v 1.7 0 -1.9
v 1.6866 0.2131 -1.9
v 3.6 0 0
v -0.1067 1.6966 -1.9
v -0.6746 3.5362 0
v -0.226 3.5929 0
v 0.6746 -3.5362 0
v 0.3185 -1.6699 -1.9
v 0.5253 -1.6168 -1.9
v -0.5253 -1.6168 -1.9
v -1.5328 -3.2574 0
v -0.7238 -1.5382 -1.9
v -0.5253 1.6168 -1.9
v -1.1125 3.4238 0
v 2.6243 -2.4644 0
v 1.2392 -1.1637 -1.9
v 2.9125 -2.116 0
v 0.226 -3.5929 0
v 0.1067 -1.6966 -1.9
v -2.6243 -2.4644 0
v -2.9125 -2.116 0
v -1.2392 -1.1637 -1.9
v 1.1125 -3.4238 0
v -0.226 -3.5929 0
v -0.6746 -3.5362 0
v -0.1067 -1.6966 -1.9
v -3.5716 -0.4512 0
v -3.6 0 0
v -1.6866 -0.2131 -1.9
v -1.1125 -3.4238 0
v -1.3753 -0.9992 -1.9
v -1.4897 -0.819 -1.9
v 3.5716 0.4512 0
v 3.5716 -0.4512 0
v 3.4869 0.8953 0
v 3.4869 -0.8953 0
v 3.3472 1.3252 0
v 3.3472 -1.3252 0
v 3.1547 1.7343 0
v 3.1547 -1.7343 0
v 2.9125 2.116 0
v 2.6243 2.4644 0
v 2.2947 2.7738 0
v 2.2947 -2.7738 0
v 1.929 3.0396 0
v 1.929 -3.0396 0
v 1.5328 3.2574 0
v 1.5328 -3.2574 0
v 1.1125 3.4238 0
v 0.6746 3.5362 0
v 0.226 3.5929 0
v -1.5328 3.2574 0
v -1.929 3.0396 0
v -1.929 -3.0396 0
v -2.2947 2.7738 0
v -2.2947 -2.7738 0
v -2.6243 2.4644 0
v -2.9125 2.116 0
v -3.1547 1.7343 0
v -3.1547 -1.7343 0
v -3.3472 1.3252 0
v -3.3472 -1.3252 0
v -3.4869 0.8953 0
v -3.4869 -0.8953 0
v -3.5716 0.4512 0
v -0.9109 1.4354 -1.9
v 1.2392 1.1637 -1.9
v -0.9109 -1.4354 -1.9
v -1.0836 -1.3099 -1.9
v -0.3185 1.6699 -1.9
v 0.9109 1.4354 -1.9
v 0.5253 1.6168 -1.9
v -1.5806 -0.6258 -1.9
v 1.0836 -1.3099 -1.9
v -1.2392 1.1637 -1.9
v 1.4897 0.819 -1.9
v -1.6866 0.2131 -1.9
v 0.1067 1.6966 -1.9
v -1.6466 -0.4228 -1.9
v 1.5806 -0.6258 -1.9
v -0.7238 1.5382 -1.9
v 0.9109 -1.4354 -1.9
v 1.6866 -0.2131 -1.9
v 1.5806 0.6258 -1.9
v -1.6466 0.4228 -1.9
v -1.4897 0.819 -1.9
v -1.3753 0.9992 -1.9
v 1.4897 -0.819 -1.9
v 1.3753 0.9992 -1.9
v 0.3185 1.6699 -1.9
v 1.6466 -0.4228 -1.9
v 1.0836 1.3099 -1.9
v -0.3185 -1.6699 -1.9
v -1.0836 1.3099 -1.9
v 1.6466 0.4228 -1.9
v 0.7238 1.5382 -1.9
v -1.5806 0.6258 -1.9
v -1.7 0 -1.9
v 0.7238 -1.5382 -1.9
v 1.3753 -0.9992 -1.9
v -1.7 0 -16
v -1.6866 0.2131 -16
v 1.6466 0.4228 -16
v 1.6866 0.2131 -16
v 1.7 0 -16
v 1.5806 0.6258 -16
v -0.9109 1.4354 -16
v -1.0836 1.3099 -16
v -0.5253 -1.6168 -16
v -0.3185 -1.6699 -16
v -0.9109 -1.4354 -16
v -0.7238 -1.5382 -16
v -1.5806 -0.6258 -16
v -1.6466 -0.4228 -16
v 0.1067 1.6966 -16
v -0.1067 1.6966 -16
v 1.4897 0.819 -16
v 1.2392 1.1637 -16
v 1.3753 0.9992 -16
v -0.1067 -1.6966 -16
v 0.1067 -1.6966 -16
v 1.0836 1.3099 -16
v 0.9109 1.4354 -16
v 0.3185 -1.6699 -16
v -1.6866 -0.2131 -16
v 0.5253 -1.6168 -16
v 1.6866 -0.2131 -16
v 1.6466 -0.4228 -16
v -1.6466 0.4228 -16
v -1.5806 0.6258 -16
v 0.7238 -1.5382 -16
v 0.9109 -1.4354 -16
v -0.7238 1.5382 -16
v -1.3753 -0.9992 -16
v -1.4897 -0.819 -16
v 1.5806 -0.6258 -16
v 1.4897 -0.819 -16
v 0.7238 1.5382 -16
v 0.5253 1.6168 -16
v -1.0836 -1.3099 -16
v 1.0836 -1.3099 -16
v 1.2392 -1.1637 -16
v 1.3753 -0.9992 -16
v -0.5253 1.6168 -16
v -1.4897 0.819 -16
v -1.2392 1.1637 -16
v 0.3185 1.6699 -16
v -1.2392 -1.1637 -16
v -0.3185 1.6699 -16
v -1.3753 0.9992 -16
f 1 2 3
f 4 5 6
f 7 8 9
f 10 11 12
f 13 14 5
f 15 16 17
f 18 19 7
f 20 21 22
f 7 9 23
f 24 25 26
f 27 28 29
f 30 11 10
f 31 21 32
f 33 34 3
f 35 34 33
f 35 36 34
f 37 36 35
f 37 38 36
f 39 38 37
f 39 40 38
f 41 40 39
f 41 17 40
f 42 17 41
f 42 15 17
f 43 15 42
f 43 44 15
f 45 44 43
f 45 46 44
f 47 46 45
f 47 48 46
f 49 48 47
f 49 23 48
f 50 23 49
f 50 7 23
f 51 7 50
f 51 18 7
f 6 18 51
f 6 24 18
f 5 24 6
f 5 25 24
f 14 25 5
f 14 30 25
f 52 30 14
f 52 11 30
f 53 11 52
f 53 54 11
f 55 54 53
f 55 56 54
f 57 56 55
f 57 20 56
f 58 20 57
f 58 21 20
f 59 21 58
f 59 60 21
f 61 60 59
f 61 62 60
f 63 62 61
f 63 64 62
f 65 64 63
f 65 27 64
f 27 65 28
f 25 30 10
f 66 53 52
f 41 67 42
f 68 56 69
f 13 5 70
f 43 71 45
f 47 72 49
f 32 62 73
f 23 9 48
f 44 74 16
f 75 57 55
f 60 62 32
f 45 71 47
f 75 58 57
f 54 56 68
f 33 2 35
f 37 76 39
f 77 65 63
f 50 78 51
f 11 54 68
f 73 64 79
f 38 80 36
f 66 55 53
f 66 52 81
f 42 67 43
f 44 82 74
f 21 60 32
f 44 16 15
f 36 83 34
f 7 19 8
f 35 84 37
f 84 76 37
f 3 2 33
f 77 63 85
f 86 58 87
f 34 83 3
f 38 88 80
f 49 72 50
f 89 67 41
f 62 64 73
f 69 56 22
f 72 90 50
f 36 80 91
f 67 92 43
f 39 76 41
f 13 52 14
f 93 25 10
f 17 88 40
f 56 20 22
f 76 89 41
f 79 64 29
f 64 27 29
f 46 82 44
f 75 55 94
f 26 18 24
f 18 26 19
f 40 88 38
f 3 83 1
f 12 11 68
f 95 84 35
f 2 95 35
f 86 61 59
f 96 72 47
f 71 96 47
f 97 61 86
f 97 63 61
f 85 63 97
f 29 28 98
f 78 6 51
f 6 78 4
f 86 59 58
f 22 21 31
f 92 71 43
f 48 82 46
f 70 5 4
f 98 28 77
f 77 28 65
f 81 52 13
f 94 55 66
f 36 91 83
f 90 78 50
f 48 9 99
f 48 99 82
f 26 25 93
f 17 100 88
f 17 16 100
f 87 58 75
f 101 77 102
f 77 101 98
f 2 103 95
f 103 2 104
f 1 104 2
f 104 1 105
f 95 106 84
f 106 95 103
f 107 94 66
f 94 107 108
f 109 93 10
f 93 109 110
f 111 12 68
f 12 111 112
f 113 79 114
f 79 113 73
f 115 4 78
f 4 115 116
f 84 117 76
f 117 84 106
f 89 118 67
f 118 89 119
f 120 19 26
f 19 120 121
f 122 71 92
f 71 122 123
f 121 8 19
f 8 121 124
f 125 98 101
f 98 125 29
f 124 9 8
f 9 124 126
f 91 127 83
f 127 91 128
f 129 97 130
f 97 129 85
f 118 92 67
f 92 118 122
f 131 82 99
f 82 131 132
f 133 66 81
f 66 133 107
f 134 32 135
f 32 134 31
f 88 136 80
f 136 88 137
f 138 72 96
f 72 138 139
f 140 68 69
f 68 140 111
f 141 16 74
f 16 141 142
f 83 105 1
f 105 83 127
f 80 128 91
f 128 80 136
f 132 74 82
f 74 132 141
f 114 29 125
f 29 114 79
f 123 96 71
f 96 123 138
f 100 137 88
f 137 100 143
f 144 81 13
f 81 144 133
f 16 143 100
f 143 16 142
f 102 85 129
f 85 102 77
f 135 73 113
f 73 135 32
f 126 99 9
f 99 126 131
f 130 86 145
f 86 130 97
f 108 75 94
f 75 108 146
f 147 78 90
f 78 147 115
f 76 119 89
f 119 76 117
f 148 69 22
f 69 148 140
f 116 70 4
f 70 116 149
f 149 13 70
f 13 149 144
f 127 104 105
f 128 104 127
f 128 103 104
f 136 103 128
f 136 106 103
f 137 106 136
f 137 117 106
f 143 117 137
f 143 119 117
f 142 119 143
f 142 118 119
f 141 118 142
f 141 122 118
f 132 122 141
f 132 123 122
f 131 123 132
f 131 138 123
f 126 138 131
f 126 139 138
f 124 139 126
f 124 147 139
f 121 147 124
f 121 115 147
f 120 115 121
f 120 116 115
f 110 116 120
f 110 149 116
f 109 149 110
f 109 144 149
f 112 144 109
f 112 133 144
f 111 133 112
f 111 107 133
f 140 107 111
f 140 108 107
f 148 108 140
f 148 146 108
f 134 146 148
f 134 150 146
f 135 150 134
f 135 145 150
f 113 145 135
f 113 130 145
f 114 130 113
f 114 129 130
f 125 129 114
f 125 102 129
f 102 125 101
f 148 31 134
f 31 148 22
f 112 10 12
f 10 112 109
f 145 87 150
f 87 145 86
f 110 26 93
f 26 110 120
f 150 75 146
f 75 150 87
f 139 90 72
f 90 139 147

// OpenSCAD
// Generated by SolidPython 1.1.3 on 2023-03-13 21:43:02
$fn = 50;


difference() {
	union() {
		translate(v = [0, 0, -1.9000000000]) {
			rotate(a = [0, 0, 0]) {
				cylinder(h = 1.9000000000, r1 = 1.7000000000, r2 = 3.6000000000);
			}
		}
		translate(v = [0, 0, -16]) {
			rotate(a = [0, 0, 0]) {
				cylinder(h = 16, r = 1.7000000000);
			}
		}
	}
	union();
}
/***********************************************
*********      SolidPython code:      **********
************************************************
 
from solid import *
import os
import subprocess

import oomB

import opsc_library_gen

mode = "laser"
#mode = "3d_print"

defined_objects = {}

radius_dict = {}
countersunk_dict = {}


def set_mode(m):
    global mode
    mode = m
    radius_dict['M6'] = 6.5/2
    radius_dict['M3'] = 3.3/2
    if mode == "laser":
        radius_dict['M6'] = 6/2
        radius_dict['M3'] = 3/2

    countersunk_dict['M3'] = {}
    countersunk_dict['M3']['little_rad'] = radius_dict['M3']
    countersunk_dict['M3']['big_rad'] = (5.5+0.6)/2
    if mode == "laser":
        countersunk_dict['M3']['big_rad'] = (4.75+0.6)/2
        countersunk_dict['M3']['little_rad'] = (4.75+0.6)/2

    countersunk_dict['M3']['height'] = 1.7


def opsc_make_object(filename, objects, save_type="none",resolution=50, layers = 1, tilediff = 200, mode="laser", overwrite=True):
    if overwrite or not os.path.exists(filename):
        set_mode(mode)
        save_type = save_type.lower()
        os.makedirs(os.path.dirname(filename), exist_ok=True)
        final_object = opsc_get_object(objects, mode = mode)
        # Save the final object to the specified filename    
        scad_render_to_file(final_object, filename, file_header='$fn = %s;' % resolution, include_orig_code=True)
        if save_type == "all":
            saveToAll(filename)
        elif save_type == "dxf":
            saveToDxf(filename)
        if mode == "laser":
            filename_laser = filename.replace(".scad","-flat.scad")
            scad_render_to_file(getLaser(final_object, layers=layers, tilediff=tilediff), filename_laser, file_header='$fn = %s;' % resolution, include_orig_code=True)
            if save_type == "all":
                saveToAll(filename_laser)
            elif save_type == "dxf":
                saveToDxf(filename_laser)


def opsc_get_object(objects, mode = "laser"):
    # Create the solidpython objects only include the positive objects and if they don't have inclusion or their inclusion is either all or mode
    # Initialize an empty list to store the results
    positive_objects = []

    # Iterate over the "objects" list
    for obj in objects:
        # Check if the current object has a "type" key with a value of "positive"
        if obj['type'] == 'positive':
            # Check if the current object has an "inclusion" key and its value matches "mode",
            # or if the current object does not have an "inclusion" key at all
            if not 'inclusion' in obj or obj['inclusion'] == "all" or obj['inclusion'] == mode:
                # Call the "get_opsc_item" function with the current object as an argument
                opsc_item = get_opsc_item(obj)
                # Add the result to the "positive_objects" list
                positive_objects.append(opsc_item)
# Initialize an empty list to store the results
    negative_objects = []

    # Iterate over the "objects" list
    for obj in objects:
        # Check if the current object has a "type" key with a value of "negative"
        if obj['type'] == 'negative':
            # Check if the current object has an "inclusion" key and its value matches "mode",
            # or if the current object does not have an "inclusion" key at all
            if not 'inclusion' in obj or obj['inclusion'] == "all" or obj['inclusion'] == mode:
                # Call the "get_opsc_item" function with the current object as an argument
                opsc_item = get_opsc_item(obj)
                # Add the result to the "negative_objects" list
                negative_objects.append(opsc_item)
    
    #positive_objects = [get_opsc_item(obj) for obj in objects if obj['type'] == 'positive']
    #negative_objects = [get_opsc_item(obj) for obj in objects if obj['type'] == 'negative']
    # Union the positive objects
    positive_object = union()(*positive_objects)
    # Union the negative objects
    negative_object = union()(*negative_objects)
    # Create the final object by subtracting the negative objects from the positive objects
    return difference()(positive_object, negative_object)

def get_opsc_item(params):
    # A dictionary to map radius string values to numerical values
    #radius_dict = {'small': 5, 'medium': 10, 'large': 15}
    # An array of function names for basic shapes
    basic_shapes = ['cube', 'sphere', 'cylinder']
    
    # An array of function names for other shapes
    other_shapes = ['hole', 'slot', 'rounded_rectangle', 'countersunk', 'polyg']
    


    # Convert radius to r if present, and remove radius from the params dictionary
    if 'radius' in params:
        if isinstance(params['radius'], str):
            # Use the radius_dict to map the radius string value to a numerical value
            params['r'] = radius_dict[params['radius']]
        else:
            params['r'] = params['radius']
        del params['radius']
    

    # Check if the object type is a basic shape
    if params['shape'] in basic_shapes:
        # Remove shape and unexpected dictionary values
        allowed_keys = {'size', 'r', 'r1', 'r2', 'd', 'h', 'rw', 'rh', 'dw', 'dh'}
        shape_params = {k: v for k, v in params.items() if k in allowed_keys}

        #params['m'] = "#"
        ###split for adding modifier
        try:
            m = params['m']
            func = globals()[params['shape']]
            return_value = get_opsc_transform(params,func(**shape_params))
            return_value = (return_value).set_modifier(m)
            return return_value
        except KeyError as e:
            return get_opsc_transform(params,globals()[params['shape']](**shape_params))
        
    elif params['shape'] == 'polygon':
        # Remove shape and unexpected dictionary values
        h  = params['height']
        allowed_keys = {'points'}
        shape_params = {k: v for k, v in params.items() if k in allowed_keys}

        # Call the corresponding function for the shape parameter, using ** notation to pass the shape_params dictionary as keyword arguments
        params["rot"] = [0,0,0]        
        try:
            m = params['m']
            func = globals()[params['shape']]
            return_value = get_opsc_transform(params,linear_extrude(h)(globals()[params['shape']](**shape_params)))
            return_value = (return_value).set_modifier(m)
            return return_value
        except KeyError as e:
            return_value = get_opsc_transform(params,linear_extrude(h)(globals()[params['shape']](**shape_params)))
            return_value = (return_value)
            return return_value


    # If the object type is not a basic shape, check if it's a defined object or one of the other shapes
    elif params['shape'] in other_shapes:
        # Call the corresponding function for the shape parameter, passing the params dictionary as an argument
        p2 = copy.deepcopy(params)
        p2["pos"] = [0,0,0]
        return get_opsc_transform(params,globals()[params['shape']](p2))
    
    # If the object is not a basic shape or a defined object, try to import it from a .scad file
    else:
        obj = defined_objects[params['shape']]
        return get_opsc_transform(params,obj)

def get_opsc_transform(params, solid_obj):
    # Rotate the object based on the 'rot' field in the params dictionary, or the 'rotX', 'rotY', and 'rotZ' fields if 'rot' is not present
    rot = params.get('rot', [])
    if rot:
        rotX, rotY, rotZ = rot
    else:
        rotX = params.get('rotX', 0)
        rotY = params.get('rotY', 0)
        rotZ = params.get('rotZ', 0)
    solid_obj = rotate([rotX, rotY, rotZ])(solid_obj)

    # Translate the object based on the 'pos' field in the params dictionary, or the 'x', 'y', and 'z' fields if 'pos' is not present
    pos = params.get('pos', [])
    if pos:
        x, y, z = pos
    else:
        x = params.get('x', 0)
        y = params.get('y', 0)
        z = params.get('z', 0)
    solid_obj = translate([x, y, z])(solid_obj)
    return solid_obj


import random

def opsc_easy_array(type, shape, repeats, pos_start, shift_arr, **kwargs):
    for i in range(0,3):
        repeats.append(1)
        pos_start.append(0)
        shift_arr.append(0)
    return_objects = []

    for x in range(0,repeats[0]):
        for y in range(0,repeats[1]):
            for z in range(0,repeats[2]):
                return_objects.append(opsc_easy(type, shape, pos=[pos_start[0]+x*shift_arr[0],pos_start[1]+y*shift_arr[1],pos_start[2]+z*shift_arr[2]], **kwargs))
    return return_objects                



def opsc_easy(type, shape, **kwargs):
    obj = {
        'type': type,
        'shape': shape
    }
    for param in ['size', 'r', 'r1', 'r2', 'd', 'h', 'rw', 'rh', 'dw', 'dh', 'pos', 'x', 'y', 'z', 'rot', 'rotX', 'rotY', 'rotZ', "w", "inclusion", 'sides', 'height', "m"]:
        if param in kwargs:
            obj[param] = kwargs[param]
    return obj

def hole(params):
    p2 = copy.deepcopy(params)  
    # Check if the radius is a string and replace it with the corresponding value from the dictionary
    if isinstance(p2['r'], str):
        p2['r'] = radius_dict[p2['r']]
    
    # Set the height to 100 if not specified
    if 'h' not in p2:
        p2['h'] = 100
        p2["pos"] = [0,0,-50]
    p2["center"] = True
    # Create the cylinder object
    p2["shape"] = "cylinder"
    p2["type"] = "positive"

    return get_opsc_item(p2)

import copy

def countersunk(params):
    p2 = copy.deepcopy(params)
    counter_rad = p2['r']
    p2['r'] = radius_dict[p2['r']]
    hp = copy.deepcopy(p2)
    hp["type"] = "positive"
    hp["shape"] = "hole"
    del hp["rot"]
    hol = get_opsc_item(hp)
    
    cp = copy.deepcopy(p2)
    cp["h"] = countersunk_dict[counter_rad]["height"]
    cp["r2"] = countersunk_dict[counter_rad]["little_rad"]
    cp["r1"] = countersunk_dict[counter_rad]["big_rad"]
    del cp["r"]
    del cp["rot"]
    cp["type"] = "positive"
    cp["shape"] = "cylinder"
    cp["pos"] = [0,0,0]

    top = get_opsc_item(cp)
    return union()(hol,top)



def slot(params):  
    p2 = copy.deepcopy(params) 
    if isinstance(p2['r'], str):
        p2['r'] = radius_dict[p2['r']]
    p2["type"] = "positive"
    p2["shape"] = "hole"
    del p2["rot"]
    p2["pos"] = [0,0,0]
    left = copy.deepcopy(p2)
    right = copy.deepcopy(p2)
    left["pos"][0] = p2["w"] / 2 - p2["r"] 
    
    right["pos"][0] = -p2["w"] / 2 + p2["r"] 
    pass
    leftObj = get_opsc_item(left)
    rightObj = get_opsc_item(right)
    return hull()(leftObj, rightObj)

def rounded_rectangle(params):   
    p2 = copy.deepcopy(params) 
    p2["h"] = p2["size"][2]
    p2["pos"] = p2.get("pos", [0, 0, 0]) 
    p2["type"] = "positive"
    p2["shape"] = "hole"
    p2["pos"] = [0,0,0]
    
    if 'rot' in p2:
        del p2["rot"]   
    if 'r' not in p2:
        p2["r"] = 5 
    tl = copy.deepcopy(p2)
    tr = copy.deepcopy(p2)
    bl = copy.deepcopy(p2)
    br = copy.deepcopy(p2)
    tl["pos"][0] = -(p2["size"][0] - p2["r"]*2)/2
    tl["pos"][1] = (p2["size"][1] - p2["r"]*2)/2
    tr["pos"][0] = (p2["size"][0] - p2["r"]*2)/2
    tr["pos"][1] = (p2["size"][1] - p2["r"]*2)/2
    bl["pos"][0] = -(p2["size"][0] - p2["r"]*2)/2
    bl["pos"][1] = -(p2["size"][1] - p2["r"]*2)/2
    br["pos"][0] = (p2["size"][0] - p2["r"]*2)/2
    br["pos"][1] = -(p2["size"][1] - p2["r"]*2)/2
    del tl["size"]
    del tr["size"]
    del bl["size"]
    del br["size"]
    tlo = get_opsc_item(tl)
    tro = get_opsc_item(tr)
    blo = get_opsc_item(bl)
    bro = get_opsc_item(br)    
    return hull()(tlo, tro, blo, bro)



def polyg(params):
    p2 = copy.deepcopy(params) 
    p2["type"] = "positive"
    p2["shape"] = "polygon"
    p2["pos"] = [0,0,0]
    sides = p2["sides"]
    radius = p2["r"]    
    angles = [i * 360 / sides for i in range(sides)]
    points = regular_polygon(sides, radius)
    
    p2["points"] = points
    return get_opsc_item(p2)

import math

def regular_polygon(num_sides, radius):
    # Calculate the angle between each side
    angle = 2 * math.pi / num_sides

    # Calculate the points of the polygon
    points = []
    for i in range(num_sides):
        x = radius * math.cos(i * angle)
        y = radius * math.sin(i * angle)
        points.append((x, y))
    return points

def import_scad_object(filename):
    # Import the .scad file and convert it to a solidpython object
    #filename = "parts"
    obj = import_scad(filename)
    return obj.main()



import os
import solid as solidpython

# A dictionary to store the defined objects


def load_scad_objects():
    opsc_library_gen.gen_library(defined_objects)

import random

def test(num_objects):
    objects = []
    for i in range(num_objects):
        # Choose a random shape
        #shape = random.choice(['cube', 'sphere', 'cylinder', 'hole', 'slot', "rounded_rectangle"])
        shape = random.choice(["rounded_rectangle"])

        # Choose a random type
        type = random.choice(['positive', 'negative'])
        
        # Create an empty object dictionary
        obj = {'shape': shape, 'type': type}
        
        # Set shape-specific parameters
        if obj['shape'] in ['cube']:
            obj['size'] =  [random.uniform(5, 15), random.uniform(5, 15), random.uniform(5, 15)]
        if obj['shape'] in ['rounded_rectangle']:
            obj['size'] =  [random.uniform(5, 15), random.uniform(5, 15), random.uniform(5, 15)]
            obj['r'] = random.uniform(0.5, 5)
        elif obj['shape'] == 'sphere':
            obj['r'] = random.uniform(5, 15)
        elif obj['shape'] in ['cylinder', 'hole']:
            obj['r'] = random.uniform(0.5, 5)
            obj['h'] = random.uniform(5, 15)
        elif obj['shape'] == 'slot':
            obj['r'] = random.uniform(0.5, 5)
            obj['h'] = random.uniform(5, 15)
            obj['w'] = random.uniform(5, 15)
        
        # Set a random position and rotation
        obj['pos'] = [random.uniform(-20, 20), random.uniform(-20, 20), random.uniform(-20, 20)]
        obj['rot'] = [random.uniform(-180, 180), random.uniform(-180, 180), random.uniform(-180, 180)]
        
        # Add the object to the list
        objects.append(obj)
    return objects

####### old file saving
def saveToAll(fileIn):
    saveToStl(fileIn)
    saveToDxf(fileIn)
    saveToPng(fileIn)
    saveToSvg(fileIn)

def saveToDxf(fileIn, fileOut="", copy_to_laser=True):
    if fileOut == "":
        fileOut = fileIn.replace(".scad",".dxf")
    saveToFile(fileIn, fileOut)


    
def saveToPng(fileIn, fileOut="",extra="--render"):
    if fileOut == "":
        fileOut = fileIn.replace(".scad",".png")
    saveToFile(fileIn, fileOut)

def saveToStl(fileIn, fileOut=""):
    if fileOut == "":
        fileOut = fileIn.replace(".scad",".stl")
    saveToFile(fileIn, fileOut)
    
def saveToSvg(fileIn, fileOut=""):
    if fileOut == "":
        fileOut = fileIn.replace(".scad",".svg")
    saveToFile(fileIn, fileOut)

def saveToFile(fileIn, fileOut,extra=""):
    #extra = extra + " --colorscheme Tomorrow"

    launchStr = 'openscad -o "' + fileOut + '"' + extra + ' "' + fileIn + '"'
    if ".png" in fileOut:
        launchStr = launchStr + " --render"
    print("            saveToFile launch string: " + launchStr)
    subprocess.run(launchStr)
    x=0

def getLaser(final_object,start=1.5,layers=1,thickness=3,tilediff=200):
        rv= []

        for x in range(layers):
            rv.append(translate([0,x*tilediff,0])(
                    projection()(
                        intersection()(translate([-500,-500,start+x*thickness])(cube(size=[1000,1000,0.1])),
                            final_object
                        )
                    )
            )
            )
            
        return union()(rv)

set_mode("laser")
load_scad_objects() 
 
************************************************/
